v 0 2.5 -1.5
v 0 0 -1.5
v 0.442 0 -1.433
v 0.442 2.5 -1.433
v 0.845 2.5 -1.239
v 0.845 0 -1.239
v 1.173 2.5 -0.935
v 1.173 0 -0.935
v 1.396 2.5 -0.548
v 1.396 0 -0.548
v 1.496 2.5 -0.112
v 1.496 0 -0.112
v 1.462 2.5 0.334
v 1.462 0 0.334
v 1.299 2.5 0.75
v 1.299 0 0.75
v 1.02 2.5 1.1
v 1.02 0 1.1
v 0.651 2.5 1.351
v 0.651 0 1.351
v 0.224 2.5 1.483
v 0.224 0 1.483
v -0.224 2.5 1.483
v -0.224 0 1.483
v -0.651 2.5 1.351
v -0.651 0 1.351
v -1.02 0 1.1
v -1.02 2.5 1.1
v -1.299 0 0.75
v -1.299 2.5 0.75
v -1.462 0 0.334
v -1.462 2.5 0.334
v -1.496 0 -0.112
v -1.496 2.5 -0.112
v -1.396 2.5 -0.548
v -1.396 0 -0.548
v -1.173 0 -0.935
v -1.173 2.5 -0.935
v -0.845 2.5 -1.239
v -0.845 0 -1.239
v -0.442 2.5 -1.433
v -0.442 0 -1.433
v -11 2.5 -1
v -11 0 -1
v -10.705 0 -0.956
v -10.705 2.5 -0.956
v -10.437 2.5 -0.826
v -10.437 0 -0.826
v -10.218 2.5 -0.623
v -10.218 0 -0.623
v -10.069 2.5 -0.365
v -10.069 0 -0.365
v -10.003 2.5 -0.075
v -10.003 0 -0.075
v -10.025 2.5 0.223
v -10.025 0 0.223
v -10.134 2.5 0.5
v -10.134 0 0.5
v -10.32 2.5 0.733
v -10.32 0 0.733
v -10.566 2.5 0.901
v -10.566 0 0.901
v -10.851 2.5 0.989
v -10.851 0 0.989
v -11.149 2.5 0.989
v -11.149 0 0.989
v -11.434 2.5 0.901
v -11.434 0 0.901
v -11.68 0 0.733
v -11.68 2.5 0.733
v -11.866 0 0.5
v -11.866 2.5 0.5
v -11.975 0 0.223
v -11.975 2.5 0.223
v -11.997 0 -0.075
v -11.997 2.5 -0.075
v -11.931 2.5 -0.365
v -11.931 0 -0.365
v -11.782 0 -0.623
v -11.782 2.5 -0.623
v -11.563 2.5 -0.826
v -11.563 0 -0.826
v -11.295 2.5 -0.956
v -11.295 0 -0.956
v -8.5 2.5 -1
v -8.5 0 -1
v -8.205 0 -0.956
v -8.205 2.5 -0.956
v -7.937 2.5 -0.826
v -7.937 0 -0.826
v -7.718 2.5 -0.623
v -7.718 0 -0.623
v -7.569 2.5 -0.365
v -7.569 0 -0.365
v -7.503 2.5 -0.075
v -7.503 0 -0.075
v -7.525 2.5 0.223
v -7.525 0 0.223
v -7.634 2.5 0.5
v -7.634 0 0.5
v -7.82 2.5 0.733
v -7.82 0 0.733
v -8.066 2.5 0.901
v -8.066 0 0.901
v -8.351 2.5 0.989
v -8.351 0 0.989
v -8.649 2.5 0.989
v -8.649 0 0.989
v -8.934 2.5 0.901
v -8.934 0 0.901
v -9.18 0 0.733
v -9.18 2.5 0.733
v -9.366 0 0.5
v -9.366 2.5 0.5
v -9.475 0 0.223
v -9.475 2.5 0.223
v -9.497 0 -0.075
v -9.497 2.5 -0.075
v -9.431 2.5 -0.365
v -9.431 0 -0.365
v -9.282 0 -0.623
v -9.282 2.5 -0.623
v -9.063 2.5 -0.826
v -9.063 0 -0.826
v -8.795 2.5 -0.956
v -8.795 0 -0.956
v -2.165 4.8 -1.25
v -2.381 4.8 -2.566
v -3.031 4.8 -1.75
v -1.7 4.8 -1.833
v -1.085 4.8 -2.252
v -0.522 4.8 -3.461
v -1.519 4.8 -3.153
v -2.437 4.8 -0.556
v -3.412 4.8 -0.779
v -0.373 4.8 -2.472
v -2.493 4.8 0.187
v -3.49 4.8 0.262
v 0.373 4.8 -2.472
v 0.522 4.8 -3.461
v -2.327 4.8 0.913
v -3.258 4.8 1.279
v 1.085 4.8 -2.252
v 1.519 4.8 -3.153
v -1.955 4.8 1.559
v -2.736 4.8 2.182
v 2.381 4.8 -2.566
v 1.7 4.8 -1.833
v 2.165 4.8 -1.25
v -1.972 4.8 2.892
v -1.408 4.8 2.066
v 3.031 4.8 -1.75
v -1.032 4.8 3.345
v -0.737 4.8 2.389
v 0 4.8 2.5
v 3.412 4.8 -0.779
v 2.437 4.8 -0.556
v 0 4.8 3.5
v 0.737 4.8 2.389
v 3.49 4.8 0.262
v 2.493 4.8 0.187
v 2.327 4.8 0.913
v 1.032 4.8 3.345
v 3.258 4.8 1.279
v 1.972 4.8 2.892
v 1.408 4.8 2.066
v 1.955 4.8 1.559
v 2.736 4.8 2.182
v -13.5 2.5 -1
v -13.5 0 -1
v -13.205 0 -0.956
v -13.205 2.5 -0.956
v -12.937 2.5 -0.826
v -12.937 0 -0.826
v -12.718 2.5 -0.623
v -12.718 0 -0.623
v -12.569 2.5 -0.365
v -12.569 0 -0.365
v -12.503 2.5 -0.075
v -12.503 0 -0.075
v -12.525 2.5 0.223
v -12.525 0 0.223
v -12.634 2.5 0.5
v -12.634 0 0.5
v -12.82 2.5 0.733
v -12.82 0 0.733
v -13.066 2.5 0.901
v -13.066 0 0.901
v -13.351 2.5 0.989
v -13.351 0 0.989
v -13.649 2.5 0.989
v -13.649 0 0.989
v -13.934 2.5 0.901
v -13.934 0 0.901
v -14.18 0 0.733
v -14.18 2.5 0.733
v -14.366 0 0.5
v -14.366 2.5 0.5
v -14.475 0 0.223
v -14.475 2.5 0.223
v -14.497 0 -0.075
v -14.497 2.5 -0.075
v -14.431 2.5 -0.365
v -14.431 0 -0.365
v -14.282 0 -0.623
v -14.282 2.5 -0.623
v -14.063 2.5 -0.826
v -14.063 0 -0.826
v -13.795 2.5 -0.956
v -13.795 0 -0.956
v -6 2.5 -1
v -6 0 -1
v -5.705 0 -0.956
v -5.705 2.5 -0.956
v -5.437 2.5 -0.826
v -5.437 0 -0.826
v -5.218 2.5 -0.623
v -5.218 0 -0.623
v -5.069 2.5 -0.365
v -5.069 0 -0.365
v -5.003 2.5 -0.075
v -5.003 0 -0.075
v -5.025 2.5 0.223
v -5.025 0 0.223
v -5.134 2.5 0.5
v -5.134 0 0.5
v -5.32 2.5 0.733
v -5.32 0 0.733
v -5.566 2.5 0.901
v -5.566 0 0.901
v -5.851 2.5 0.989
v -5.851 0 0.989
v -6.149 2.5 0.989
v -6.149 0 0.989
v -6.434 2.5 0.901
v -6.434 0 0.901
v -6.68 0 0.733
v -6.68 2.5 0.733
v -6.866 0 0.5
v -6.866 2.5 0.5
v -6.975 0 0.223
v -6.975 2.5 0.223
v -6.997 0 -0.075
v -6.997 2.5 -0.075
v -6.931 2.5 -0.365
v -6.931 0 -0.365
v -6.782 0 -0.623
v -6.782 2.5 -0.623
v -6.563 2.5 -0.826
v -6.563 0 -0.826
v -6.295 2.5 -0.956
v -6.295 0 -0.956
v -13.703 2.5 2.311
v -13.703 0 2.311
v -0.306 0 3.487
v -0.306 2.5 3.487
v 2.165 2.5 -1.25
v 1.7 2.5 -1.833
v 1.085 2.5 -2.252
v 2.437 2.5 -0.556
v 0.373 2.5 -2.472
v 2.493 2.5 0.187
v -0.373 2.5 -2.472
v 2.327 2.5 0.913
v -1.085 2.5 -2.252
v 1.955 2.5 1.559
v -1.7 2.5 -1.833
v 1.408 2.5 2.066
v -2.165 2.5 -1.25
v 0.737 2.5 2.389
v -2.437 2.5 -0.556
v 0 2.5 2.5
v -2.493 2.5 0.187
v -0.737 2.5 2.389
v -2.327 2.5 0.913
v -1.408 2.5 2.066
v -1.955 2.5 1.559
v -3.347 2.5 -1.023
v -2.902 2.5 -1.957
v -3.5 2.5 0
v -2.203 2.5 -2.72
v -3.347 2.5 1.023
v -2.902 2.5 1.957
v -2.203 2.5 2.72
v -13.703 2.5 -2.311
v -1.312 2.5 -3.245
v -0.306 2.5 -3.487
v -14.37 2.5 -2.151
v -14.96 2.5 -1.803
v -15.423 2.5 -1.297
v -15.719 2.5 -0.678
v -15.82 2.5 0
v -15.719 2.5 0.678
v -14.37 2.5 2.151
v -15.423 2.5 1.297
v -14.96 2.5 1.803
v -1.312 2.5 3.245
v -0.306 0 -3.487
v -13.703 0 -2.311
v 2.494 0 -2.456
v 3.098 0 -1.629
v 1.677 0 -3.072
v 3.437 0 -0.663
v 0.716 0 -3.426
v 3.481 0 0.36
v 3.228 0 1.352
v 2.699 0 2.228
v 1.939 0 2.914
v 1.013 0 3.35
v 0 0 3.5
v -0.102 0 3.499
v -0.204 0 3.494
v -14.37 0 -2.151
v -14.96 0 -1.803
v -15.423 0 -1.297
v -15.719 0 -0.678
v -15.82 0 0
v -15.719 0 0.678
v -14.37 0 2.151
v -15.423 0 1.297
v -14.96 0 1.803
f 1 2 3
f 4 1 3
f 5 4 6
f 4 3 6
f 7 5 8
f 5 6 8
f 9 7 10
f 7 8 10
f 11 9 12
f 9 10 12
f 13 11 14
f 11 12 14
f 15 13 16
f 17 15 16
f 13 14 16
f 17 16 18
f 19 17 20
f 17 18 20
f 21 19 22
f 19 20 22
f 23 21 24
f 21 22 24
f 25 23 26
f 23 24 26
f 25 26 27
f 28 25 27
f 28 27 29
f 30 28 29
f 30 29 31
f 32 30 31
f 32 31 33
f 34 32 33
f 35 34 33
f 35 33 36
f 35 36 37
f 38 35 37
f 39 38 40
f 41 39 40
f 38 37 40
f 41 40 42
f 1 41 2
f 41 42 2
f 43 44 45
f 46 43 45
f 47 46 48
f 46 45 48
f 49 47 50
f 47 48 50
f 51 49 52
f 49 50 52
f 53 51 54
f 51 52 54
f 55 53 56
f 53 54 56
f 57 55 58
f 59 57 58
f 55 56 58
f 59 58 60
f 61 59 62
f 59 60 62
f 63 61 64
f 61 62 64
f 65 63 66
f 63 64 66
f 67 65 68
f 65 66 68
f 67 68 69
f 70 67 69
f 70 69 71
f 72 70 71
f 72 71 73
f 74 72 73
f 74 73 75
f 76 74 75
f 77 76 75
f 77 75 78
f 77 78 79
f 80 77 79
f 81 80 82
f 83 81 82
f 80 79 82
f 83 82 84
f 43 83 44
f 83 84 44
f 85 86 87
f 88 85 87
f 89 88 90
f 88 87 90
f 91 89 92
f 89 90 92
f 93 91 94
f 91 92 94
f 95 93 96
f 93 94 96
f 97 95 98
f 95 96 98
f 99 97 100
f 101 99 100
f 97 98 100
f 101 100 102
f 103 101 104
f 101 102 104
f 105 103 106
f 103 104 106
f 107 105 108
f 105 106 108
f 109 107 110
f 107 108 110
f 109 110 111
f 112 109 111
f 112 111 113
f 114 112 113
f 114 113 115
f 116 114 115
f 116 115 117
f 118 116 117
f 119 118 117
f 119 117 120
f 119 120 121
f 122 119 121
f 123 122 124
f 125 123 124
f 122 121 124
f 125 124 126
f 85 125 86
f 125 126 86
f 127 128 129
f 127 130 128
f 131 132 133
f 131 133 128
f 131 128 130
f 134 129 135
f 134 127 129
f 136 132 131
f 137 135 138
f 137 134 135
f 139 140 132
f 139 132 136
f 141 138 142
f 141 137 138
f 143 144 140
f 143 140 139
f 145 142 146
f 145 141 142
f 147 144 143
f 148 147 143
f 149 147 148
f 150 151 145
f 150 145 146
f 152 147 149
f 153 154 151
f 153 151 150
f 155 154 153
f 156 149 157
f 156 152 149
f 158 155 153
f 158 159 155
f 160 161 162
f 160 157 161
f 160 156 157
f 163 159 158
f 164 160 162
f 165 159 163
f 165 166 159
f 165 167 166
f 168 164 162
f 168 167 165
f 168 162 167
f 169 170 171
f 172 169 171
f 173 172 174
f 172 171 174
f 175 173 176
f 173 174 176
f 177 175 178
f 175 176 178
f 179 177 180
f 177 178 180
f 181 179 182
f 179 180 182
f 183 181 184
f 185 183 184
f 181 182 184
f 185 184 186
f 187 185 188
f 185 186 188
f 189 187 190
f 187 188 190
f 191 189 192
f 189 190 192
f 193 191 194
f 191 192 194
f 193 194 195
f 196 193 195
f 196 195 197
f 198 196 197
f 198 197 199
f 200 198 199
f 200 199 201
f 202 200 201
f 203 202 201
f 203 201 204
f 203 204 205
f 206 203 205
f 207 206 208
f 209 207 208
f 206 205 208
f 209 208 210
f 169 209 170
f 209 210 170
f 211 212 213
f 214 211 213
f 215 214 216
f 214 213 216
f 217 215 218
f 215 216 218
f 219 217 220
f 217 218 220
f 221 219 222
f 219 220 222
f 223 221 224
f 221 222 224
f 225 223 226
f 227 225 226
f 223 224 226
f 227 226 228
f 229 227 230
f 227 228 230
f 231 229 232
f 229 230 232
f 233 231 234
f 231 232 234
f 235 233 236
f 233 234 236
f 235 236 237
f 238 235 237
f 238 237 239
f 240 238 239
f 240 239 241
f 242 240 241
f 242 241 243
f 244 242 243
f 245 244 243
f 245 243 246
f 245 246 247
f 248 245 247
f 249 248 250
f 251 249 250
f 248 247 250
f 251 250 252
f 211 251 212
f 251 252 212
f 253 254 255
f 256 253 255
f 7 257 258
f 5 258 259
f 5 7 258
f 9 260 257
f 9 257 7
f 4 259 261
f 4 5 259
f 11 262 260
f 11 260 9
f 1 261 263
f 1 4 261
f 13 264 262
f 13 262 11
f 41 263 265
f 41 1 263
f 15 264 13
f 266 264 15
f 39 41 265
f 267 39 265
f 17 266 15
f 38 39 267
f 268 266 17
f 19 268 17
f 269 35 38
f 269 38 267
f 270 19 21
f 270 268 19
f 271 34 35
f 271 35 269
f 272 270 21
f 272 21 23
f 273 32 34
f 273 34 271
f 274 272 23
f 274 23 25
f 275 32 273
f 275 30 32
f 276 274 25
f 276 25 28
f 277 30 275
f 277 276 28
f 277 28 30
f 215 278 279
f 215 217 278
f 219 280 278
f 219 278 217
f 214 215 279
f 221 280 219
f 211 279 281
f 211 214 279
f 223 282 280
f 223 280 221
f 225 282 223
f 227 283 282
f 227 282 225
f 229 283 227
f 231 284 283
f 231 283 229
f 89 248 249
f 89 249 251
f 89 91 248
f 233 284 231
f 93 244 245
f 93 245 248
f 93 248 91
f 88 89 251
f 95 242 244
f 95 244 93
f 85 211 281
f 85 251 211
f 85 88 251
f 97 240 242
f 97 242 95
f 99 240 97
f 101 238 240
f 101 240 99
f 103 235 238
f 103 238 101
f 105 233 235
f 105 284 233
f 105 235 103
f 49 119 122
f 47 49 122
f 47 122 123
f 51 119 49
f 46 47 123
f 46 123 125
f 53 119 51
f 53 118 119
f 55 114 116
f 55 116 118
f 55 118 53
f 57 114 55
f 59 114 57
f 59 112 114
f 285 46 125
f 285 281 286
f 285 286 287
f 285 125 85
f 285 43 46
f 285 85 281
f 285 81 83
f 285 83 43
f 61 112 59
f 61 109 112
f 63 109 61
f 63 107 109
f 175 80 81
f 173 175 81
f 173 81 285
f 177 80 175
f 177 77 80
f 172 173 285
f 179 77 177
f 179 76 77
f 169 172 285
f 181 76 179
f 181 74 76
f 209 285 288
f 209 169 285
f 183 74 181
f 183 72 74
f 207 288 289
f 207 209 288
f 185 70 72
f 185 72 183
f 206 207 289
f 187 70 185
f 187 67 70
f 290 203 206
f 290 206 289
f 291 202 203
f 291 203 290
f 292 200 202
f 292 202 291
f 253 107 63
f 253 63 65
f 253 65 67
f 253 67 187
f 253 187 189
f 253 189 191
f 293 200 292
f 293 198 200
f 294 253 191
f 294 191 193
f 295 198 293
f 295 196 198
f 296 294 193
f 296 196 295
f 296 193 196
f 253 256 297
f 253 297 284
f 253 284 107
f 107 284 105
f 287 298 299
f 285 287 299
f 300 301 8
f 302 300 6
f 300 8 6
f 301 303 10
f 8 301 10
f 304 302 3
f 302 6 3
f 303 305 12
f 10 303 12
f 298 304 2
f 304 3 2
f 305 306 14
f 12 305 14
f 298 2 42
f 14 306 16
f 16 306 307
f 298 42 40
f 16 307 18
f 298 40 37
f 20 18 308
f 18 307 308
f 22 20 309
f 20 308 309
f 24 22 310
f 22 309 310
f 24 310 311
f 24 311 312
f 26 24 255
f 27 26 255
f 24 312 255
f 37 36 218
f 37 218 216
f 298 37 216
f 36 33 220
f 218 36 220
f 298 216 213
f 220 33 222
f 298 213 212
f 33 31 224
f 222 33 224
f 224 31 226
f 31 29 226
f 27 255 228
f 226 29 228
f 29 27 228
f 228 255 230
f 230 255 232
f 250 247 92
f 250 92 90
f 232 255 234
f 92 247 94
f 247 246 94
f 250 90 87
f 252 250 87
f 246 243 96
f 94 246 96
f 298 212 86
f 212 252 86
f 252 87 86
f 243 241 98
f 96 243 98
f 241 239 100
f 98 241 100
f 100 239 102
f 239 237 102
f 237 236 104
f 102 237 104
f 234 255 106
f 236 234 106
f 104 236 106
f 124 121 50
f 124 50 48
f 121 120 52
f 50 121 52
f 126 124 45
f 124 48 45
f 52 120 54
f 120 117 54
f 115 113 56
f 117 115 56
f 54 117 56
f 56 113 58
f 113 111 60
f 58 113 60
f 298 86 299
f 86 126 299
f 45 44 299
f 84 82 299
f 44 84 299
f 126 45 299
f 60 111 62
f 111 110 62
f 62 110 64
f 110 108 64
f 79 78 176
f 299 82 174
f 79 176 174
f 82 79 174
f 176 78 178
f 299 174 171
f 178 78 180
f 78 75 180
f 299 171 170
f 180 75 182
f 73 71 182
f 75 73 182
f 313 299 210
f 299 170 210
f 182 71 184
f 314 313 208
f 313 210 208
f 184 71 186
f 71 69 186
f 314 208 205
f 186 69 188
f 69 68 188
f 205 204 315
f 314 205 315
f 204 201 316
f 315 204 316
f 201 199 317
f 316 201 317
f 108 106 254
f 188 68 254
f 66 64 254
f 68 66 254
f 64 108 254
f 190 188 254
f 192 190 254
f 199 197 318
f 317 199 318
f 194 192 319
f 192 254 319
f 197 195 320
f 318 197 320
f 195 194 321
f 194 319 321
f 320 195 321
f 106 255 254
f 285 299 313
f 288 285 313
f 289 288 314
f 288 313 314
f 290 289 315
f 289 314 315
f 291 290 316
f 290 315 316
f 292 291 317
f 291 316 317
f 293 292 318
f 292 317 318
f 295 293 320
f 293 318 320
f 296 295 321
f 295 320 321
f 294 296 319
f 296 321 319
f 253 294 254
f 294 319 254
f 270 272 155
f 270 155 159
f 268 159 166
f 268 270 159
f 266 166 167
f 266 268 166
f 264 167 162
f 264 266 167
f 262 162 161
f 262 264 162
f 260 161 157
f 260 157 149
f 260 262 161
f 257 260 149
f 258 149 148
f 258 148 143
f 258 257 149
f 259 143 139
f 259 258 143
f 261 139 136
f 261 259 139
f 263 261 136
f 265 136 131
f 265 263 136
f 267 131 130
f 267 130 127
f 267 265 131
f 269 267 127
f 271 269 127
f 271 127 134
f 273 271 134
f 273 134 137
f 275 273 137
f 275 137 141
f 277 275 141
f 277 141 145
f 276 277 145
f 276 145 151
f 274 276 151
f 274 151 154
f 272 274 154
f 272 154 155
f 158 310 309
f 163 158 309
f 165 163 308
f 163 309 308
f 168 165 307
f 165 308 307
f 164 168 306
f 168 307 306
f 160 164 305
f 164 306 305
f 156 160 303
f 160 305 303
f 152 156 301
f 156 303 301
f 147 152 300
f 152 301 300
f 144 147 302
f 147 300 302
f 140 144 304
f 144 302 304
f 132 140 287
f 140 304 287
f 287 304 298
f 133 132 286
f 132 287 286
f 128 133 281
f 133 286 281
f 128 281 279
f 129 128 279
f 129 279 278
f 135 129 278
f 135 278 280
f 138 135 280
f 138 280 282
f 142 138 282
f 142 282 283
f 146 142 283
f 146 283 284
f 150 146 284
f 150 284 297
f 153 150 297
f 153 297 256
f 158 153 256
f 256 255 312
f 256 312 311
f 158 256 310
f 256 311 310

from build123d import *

# Parameters (mm, degrees)
SKETCH_1_R      = 3.5
SKETCH_1_R_2    = 2.5
EXTRUDE_1_DEPTH = 4.8
SKETCH_2_R      = 1.5
SKETCH_2_R_2    = 1
EXTRUDE_2_DEPTH = 2.5


with BuildPart() as part:
    # 草图1 → 凸台-拉伸1 (new body)
    with BuildSketch(Plane(origin=(0, 0, 0), x_dir=(1, 0, 0), z_dir=(0, 1, 0))):
        with Locations(Location((0, 0, 0), (0, 0, 270))):
            Circle(SKETCH_1_R)
        with Locations(Location((0, 0, 0), (0, 0, 270))):
            Circle(SKETCH_1_R_2, mode=Mode.SUBTRACT)
    extrude(amount=EXTRUDE_1_DEPTH)

    # 草图2 → 凸台-拉伸2 (add)
    with BuildSketch(Plane.XZ):
        with BuildLine():
            Line((-13.702785185, 2.311120544), (-0.305925926, 3.486604269))
            ThreePointArc((-0.305925926, 3.486604269), (3.5, 0), (-0.305925926, -3.486604269))
            Line((-0.305925926, -3.486604269), (-13.702785185, -2.311120544))
            ThreePointArc((-13.702785185, -2.311120544), (-15.82, 0), (-13.702785185, 2.311120544))
        make_face()
        with Locations(Location((0, 0, 0), (0, 0, 270))):
            Circle(SKETCH_2_R, mode=Mode.SUBTRACT)
        with Locations(Location((-13.5, 0, 0), (0, 0, 270))):
            Circle(SKETCH_2_R_2, mode=Mode.SUBTRACT)
        with Locations(Location((-11, 0, 0), (0, 0, 270))):
            Circle(SKETCH_2_R_2, mode=Mode.SUBTRACT)
        with Locations(Location((-8.5, 0, 0), (0, 0, 270))):
            Circle(SKETCH_2_R_2, mode=Mode.SUBTRACT)
        with Locations(Location((-6, 0, 0), (0, 0, 270))):
            Circle(SKETCH_2_R_2, mode=Mode.SUBTRACT)
    extrude(amount=-EXTRUDE_2_DEPTH)


solid = part.part
